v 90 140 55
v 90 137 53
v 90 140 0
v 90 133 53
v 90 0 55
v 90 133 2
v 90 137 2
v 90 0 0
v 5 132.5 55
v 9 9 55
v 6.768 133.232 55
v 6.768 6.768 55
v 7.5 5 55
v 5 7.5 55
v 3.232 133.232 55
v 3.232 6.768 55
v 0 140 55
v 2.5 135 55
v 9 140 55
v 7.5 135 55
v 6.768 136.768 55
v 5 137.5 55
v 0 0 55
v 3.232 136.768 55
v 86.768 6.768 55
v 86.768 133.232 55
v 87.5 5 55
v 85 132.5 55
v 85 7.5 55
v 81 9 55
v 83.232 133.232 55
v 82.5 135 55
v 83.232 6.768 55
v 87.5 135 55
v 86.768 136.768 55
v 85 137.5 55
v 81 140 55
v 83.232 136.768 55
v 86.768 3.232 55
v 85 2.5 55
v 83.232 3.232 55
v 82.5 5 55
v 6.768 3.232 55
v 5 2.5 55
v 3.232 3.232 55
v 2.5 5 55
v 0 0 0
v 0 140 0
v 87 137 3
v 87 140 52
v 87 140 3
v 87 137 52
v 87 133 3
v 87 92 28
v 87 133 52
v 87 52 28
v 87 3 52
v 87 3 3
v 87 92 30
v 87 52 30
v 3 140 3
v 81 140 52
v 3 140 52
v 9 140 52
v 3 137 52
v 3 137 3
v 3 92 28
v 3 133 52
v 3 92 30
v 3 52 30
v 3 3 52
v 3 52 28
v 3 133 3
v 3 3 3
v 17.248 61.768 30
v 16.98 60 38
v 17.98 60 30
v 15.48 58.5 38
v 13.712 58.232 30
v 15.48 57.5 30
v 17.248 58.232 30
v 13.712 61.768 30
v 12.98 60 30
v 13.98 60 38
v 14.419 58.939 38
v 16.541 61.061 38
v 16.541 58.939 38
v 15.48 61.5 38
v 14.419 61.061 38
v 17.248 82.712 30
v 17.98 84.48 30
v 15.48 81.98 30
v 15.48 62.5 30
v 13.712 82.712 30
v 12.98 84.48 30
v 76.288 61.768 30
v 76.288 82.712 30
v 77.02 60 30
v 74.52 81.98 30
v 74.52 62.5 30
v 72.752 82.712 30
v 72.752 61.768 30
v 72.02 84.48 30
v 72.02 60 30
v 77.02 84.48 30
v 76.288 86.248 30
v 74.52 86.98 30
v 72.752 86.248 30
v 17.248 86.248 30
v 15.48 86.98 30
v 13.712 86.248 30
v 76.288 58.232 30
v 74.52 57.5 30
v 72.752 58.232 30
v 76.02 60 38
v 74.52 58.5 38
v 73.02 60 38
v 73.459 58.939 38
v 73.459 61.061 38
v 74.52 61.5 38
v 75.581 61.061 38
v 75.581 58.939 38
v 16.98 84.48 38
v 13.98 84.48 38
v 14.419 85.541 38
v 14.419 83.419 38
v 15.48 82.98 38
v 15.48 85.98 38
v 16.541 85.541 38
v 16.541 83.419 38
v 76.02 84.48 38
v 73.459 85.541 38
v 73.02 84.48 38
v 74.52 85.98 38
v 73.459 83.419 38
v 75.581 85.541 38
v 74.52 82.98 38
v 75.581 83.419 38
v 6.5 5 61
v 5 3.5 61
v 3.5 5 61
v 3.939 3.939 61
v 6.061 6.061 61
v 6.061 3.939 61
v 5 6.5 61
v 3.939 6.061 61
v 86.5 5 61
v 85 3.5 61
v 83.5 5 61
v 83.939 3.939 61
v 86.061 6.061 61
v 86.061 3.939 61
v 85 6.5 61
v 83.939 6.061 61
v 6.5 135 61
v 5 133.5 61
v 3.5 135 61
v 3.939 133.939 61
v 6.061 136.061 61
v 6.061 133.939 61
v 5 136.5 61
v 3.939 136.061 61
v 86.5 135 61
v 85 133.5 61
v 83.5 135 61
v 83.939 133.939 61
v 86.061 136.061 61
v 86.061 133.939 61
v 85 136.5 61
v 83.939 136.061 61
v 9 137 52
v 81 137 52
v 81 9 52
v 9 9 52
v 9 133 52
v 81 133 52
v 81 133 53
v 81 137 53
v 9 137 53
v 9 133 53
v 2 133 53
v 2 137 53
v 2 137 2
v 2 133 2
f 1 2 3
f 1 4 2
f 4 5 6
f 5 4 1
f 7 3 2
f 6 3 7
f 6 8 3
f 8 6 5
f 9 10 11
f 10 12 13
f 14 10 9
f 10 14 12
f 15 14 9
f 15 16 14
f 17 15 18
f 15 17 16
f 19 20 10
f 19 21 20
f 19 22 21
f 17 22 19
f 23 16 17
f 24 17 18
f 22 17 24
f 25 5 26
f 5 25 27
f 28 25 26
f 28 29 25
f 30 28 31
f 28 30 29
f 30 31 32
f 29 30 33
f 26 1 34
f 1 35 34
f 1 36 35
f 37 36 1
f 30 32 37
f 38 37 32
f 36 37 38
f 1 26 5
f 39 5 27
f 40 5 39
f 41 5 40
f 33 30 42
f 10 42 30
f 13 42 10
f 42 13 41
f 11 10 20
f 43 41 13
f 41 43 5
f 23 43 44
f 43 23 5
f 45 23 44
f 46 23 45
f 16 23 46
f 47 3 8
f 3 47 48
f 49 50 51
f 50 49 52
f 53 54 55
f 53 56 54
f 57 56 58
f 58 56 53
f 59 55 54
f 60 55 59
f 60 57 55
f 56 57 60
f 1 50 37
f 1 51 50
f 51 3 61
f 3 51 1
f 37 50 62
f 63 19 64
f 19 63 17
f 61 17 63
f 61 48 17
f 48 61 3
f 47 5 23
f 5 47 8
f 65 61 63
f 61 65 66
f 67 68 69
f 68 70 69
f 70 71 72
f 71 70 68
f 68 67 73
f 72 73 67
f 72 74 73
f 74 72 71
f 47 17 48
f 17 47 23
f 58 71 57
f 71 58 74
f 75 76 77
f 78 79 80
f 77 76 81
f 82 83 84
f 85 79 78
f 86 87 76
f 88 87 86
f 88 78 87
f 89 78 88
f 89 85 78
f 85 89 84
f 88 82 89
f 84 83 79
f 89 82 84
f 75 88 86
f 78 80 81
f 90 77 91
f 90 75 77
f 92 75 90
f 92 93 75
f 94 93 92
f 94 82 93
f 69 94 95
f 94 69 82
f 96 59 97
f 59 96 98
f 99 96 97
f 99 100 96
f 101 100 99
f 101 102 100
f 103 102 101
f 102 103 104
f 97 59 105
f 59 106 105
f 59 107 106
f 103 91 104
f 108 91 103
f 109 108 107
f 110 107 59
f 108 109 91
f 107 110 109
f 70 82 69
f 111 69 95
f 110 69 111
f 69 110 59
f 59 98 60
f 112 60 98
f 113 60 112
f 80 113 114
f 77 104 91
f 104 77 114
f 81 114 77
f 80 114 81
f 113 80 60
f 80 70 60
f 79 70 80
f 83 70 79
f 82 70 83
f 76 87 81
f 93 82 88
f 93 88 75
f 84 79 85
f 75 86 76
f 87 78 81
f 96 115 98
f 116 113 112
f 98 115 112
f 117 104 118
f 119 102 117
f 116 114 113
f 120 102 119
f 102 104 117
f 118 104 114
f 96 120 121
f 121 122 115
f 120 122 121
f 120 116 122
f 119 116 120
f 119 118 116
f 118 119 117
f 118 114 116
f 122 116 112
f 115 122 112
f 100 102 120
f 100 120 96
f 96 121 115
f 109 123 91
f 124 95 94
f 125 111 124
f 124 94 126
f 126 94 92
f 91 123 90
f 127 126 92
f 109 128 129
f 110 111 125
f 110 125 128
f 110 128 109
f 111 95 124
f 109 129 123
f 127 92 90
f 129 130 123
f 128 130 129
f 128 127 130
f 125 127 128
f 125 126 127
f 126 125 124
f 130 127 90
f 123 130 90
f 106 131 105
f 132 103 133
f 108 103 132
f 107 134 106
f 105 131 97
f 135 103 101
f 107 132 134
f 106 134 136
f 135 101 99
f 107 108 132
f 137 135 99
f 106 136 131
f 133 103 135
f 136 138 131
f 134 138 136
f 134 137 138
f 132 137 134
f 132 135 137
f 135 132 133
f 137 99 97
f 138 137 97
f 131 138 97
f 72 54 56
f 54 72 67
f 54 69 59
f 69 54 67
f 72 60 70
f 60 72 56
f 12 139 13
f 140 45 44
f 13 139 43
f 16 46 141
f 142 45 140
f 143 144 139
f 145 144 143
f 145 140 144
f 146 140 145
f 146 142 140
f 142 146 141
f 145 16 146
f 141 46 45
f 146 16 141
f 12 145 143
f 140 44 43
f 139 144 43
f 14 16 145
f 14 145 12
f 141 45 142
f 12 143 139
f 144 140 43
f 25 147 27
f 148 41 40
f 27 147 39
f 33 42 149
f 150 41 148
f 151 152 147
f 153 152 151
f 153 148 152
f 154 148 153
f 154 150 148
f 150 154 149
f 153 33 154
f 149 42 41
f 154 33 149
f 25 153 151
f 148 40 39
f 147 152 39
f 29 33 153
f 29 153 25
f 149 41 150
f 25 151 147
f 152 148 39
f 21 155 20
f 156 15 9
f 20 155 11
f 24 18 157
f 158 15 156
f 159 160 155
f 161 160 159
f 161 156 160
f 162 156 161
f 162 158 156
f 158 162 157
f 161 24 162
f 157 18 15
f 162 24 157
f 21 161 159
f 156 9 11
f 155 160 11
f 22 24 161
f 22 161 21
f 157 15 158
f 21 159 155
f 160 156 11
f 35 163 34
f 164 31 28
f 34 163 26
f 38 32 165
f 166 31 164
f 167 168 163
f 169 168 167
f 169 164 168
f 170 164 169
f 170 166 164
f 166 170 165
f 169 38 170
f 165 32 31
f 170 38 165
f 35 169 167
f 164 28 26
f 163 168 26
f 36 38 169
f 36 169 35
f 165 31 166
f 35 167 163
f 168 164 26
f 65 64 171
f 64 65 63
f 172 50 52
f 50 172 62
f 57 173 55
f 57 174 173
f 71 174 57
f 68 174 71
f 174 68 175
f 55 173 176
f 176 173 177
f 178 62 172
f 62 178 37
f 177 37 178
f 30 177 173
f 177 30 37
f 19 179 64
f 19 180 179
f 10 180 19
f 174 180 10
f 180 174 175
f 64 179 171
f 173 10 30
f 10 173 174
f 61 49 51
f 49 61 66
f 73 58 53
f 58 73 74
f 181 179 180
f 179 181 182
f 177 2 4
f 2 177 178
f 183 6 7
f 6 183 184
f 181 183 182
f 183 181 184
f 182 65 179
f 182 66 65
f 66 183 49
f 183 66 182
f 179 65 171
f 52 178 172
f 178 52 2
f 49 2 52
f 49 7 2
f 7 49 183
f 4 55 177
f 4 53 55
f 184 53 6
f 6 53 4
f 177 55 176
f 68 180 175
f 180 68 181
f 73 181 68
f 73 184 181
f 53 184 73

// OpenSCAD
// file: params.scad
// Ansible widget cases
//
// Params: sets the we want
// -----------------------------------------------------------------------------

// Overall case
CASE_WIDTH = 90;
CASE_LENGTH = 140;
CASE_HEIGHT = 55;
WALL_THICKNESS = 3;
FLOOR_THICKNESS = WALL_THICKNESS;

// -----------------------------------------------------------------------------

// Front door
FRONT_DOOR_THICKNESS = 3;
FRONT_DOOR_INSET = 1;  // how much gap to give
FRONT_DOOR_OFFSET_Y = 4; // how far in from the edge
FRONT_DOOR_WIDTH = CASE_WIDTH - WALL_THICKNESS - FRONT_DOOR_INSET;
FRONT_DOOR_HEIGHT = CASE_HEIGHT - (WALL_THICKNESS * 2) + (FRONT_DOOR_INSET * 2);

// -----------------------------------------------------------------------------

// Pi shelf
SHELF_THICKNESS = WALL_THICKNESS - 1;
SHELF_Y = 52;
SHELF_LENGTH = 40;
SHELF_HEIGHT = 28;
SHELF_PEG_OFFSET_X = 3.5;
SHELF_PEG_OFFSET_Y = 3.0;
SHELF_PEG_HEIGHT = 8;
SHELF_PEG_RADIUS_BASE = 2.5;
SHELF_PEG_RADIUS_TOP = 1.5;

// -----------------------------------------------------------------------------

// Lid
LID_THICKNESS = WALL_THICKNESS;
DOCK_BORDER_HEIGHT = 9;
DOCK_BORDER_THICKNESS = 4;
DOCK_INSET = 2;

// Lid ridge
RIDGE_THICKNESS = WALL_THICKNESS * 2;
RIDGE_PEG_HEIGHT = 6;
RIDGE_PEG_RADIUS_BASE = 2.5;
RIDGE_PEG_RADIUS_TOP = 1.5;
RIDGE_PEG_RADIUS_HOLE = 2;
RIDGE_PEG_OFFSET = 5;

// -----------------------------------------------------------------------------

// General mount
MOUNT_HEIGHT = 15;
MOUNT_THICKNESS = 3;

// Selector dock
SELECTOR_DOCK_Y = CASE_LENGTH * .78;
SELECTOR_DOCK_RADIUS = 18;
SELECTOR_DOCK_BORDER_RADIUS = SELECTOR_DOCK_RADIUS + DOCK_BORDER_THICKNESS;
SELECTOR_HOLE_OFFSET = DOCK_BORDER_THICKNESS;
SELECTOR_HOLE_SIZE = SELECTOR_DOCK_RADIUS - SELECTOR_HOLE_OFFSET;

// Selector mount
SELECTOR_MOUNT_OFFSET = 0.5;
SELECTOR_MOUNT_RADIUS = SELECTOR_DOCK_RADIUS - SELECTOR_MOUNT_OFFSET;
SELECTOR_HOLE_RADIUS = SELECTOR_MOUNT_RADIUS - SELECTOR_HOLE_OFFSET;
SELECTOR_GRIP_HEIGHT = 5;
SELECTOR_GRIP_THICKNESS = 7;

// Widget dock
WIDGET_DOCK_Y = CASE_LENGTH * .15;
WIDGET_DOCK_SIZE = 32;
WIDGET_BORDER_RADIUS = 5/2;
WIDGET_HOLE_OFFSET = DOCK_BORDER_THICKNESS * 2;
WIDGET_HOLE_SIZE = WIDGET_DOCK_SIZE - WIDGET_HOLE_OFFSET;

// -----------------------------------------------------------------------------

// Pi
PI_COLOR = [0.3, 0.4, 0.3];
PI_Y = SHELF_Y + 5;
PI_WIDTH = 66.04;
PI_LENGTH = 30.48;
PI_DEPTH = 1.5;

// Battery pack
BATTERY_COLOR = [0.2, 0.2, 0.2];
BATTERY_WIDTH = 68.58;
BATTERY_LENGTH = 96.52;
BATTERY_DEPTH = 22.86;

// -----------------------------------------------------------------------------

// Magnet selector
MAGNET_PEG_HEIGHT = 7;
MAGNET_PEG_RADIUS_BASE = 2.5;
MAGNET_PEG_RADIUS_TOP = 1.5;
MAGNET_BASE_HEIGHT = 2;
MAGNET_BOARD_WIDTH = 23;
MAGNET_BOARD_HEIGHT = 21;
MAGNET_HOLE_WIDTH = MAGNET_BOARD_WIDTH - 5;
MAGNET_HOLE_LENGTH = 10;
MAGNET_BOARD_INSET = 1;
MAGNET_BOARD_INSET_WIDTH = MAGNET_BOARD_WIDTH + MAGNET_BOARD_INSET;
MAGNET_BOARD_INSET_HEIGHT = MAGNET_BOARD_HEIGHT + MAGNET_BOARD_INSET;
MAGNET_BOARD_INSET_DEPTH = 1;
// main file
// Ansible widget cases
//
// Case: walls and floor for case
// -----------------------------------------------------------------------------

include <params.scad>;

// -----------------------------------------------------------------------------

module case() {
	// Difference to cut out door slot
	difference() {
		// Union floor, side walls, ridge, shelf
		union() {
			// Floor
			cube([CASE_WIDTH, CASE_LENGTH, FLOOR_THICKNESS]);
			
			// Side and back walls
			_case_walls();
			
			// Pi shelf
			_pi_shelf();
		   
			// Ridges
			_ridges();
		}
			
		// Cut out the door slot
		_door_slot();
	}
}

// -----------------------------------------------------------------------------

module _case_walls() {
	// Side wall (far side)
	translate([
		CASE_WIDTH - WALL_THICKNESS,
		0,
		0
	])
		cube([WALL_THICKNESS, CASE_LENGTH, CASE_HEIGHT]);
	
	// Side wall (near side)
	translate([
		0,
		0,
		0
	])
		cube([WALL_THICKNESS, CASE_LENGTH, CASE_HEIGHT]);

	// Back wall
	cube([CASE_WIDTH, WALL_THICKNESS, CASE_HEIGHT]);
}

// -----------------------------------------------------------------------------

module _ridges() {
	// Side ridge (far)
	translate([
		CASE_WIDTH - RIDGE_THICKNESS - WALL_THICKNESS,
		WALL_THICKNESS,
		CASE_HEIGHT - WALL_THICKNESS
	])
		cube([
			RIDGE_THICKNESS,
			CASE_LENGTH - WALL_THICKNESS,
			WALL_THICKNESS
		]);

	// Side ridge (near)
	translate([
		WALL_THICKNESS,
		WALL_THICKNESS,
		CASE_HEIGHT - WALL_THICKNESS
	])
		cube([
			RIDGE_THICKNESS,
			CASE_LENGTH - WALL_THICKNESS,
			WALL_THICKNESS
		]);

	// Back ridge
	translate([
		0,
		WALL_THICKNESS,
		CASE_HEIGHT - WALL_THICKNESS
	])
		cube([
			CASE_WIDTH,
			RIDGE_THICKNESS,
			WALL_THICKNESS
		]);

	// Ridge pegs
	_ridge_pegs();
}

// -----------------------------------------------------------------------------

module _ridge_pegs() {    
	translate([
		RIDGE_PEG_OFFSET,
		RIDGE_PEG_OFFSET,
		CASE_HEIGHT
	])
		cylinder(RIDGE_PEG_HEIGHT, RIDGE_PEG_RADIUS_BASE, RIDGE_PEG_RADIUS_TOP);

	translate([
		CASE_WIDTH - RIDGE_PEG_OFFSET,
		RIDGE_PEG_OFFSET,
		CASE_HEIGHT
	])
		cylinder(RIDGE_PEG_HEIGHT, RIDGE_PEG_RADIUS_BASE, RIDGE_PEG_RADIUS_TOP);

	translate([
		RIDGE_PEG_OFFSET,
		CASE_LENGTH - RIDGE_PEG_OFFSET,
		CASE_HEIGHT
	])
		cylinder(RIDGE_PEG_HEIGHT, RIDGE_PEG_RADIUS_BASE, RIDGE_PEG_RADIUS_TOP);

	translate([
		CASE_WIDTH - RIDGE_PEG_OFFSET,
		CASE_LENGTH - RIDGE_PEG_OFFSET,
		CASE_HEIGHT
	])
		cylinder(RIDGE_PEG_HEIGHT, RIDGE_PEG_RADIUS_BASE, RIDGE_PEG_RADIUS_TOP);
}

// -----------------------------------------------------------------------------

module _pi_shelf() {
	// Pi shelf
	translate([
		0,
		// Move it down to the right spot in the case
		SHELF_Y,
		// Move it up to the right height (with room for the battery)
		SHELF_HEIGHT
	])
		cube([CASE_WIDTH, SHELF_LENGTH, SHELF_THICKNESS]);

	// Pi pegs
	translate([
		// Center it
		(CASE_WIDTH / 2) - (PI_WIDTH / 2),
		// Move it down to the right spot on the shelf
		PI_Y,
		// Put it right on top of the shelf
		SHELF_HEIGHT + SHELF_THICKNESS
	])
		_pi_pegs();
}

// -----------------------------------------------------------------------------

module _pi_pegs() {    
    translate([
		SHELF_PEG_OFFSET_X,
		SHELF_PEG_OFFSET_Y,
		0
	])
        cylinder(SHELF_PEG_HEIGHT, SHELF_PEG_RADIUS_BASE, SHELF_PEG_RADIUS_TOP);

    translate([
		// Offset from end of Pi
		PI_WIDTH - SHELF_PEG_OFFSET_X,
		SHELF_PEG_OFFSET_Y,
		0
	])
        cylinder(SHELF_PEG_HEIGHT, SHELF_PEG_RADIUS_BASE, SHELF_PEG_RADIUS_TOP);

    translate([
		SHELF_PEG_OFFSET_X,
		// Offset from end of Pi
		PI_LENGTH - SHELF_PEG_OFFSET_Y,
		0
	])
        cylinder(SHELF_PEG_HEIGHT, SHELF_PEG_RADIUS_BASE, SHELF_PEG_RADIUS_TOP);

    translate([
		// Offset from end of Pi
		PI_WIDTH - SHELF_PEG_OFFSET_X,
		// Offset from end of Pi
		PI_LENGTH - SHELF_PEG_OFFSET_Y,
		0
	])
        cylinder(SHELF_PEG_HEIGHT, SHELF_PEG_RADIUS_BASE, SHELF_PEG_RADIUS_TOP);
}

// -----------------------------------------------------------------------------

module _door_slot() {
	// Cut out the door slot
	translate([
		// Move in enough for the inset
		WALL_THICKNESS - FRONT_DOOR_INSET,
		// Put it at the end of the case, subtracting the wall and the
		// offset
		CASE_LENGTH - WALL_THICKNESS - FRONT_DOOR_OFFSET_Y,
		// Move in enough for the inset
		WALL_THICKNESS - FRONT_DOOR_INSET
	])
		cube([
			// Door slot should go full width so the one side is open
			CASE_WIDTH,
			// Door slot thickness
			FRONT_DOOR_THICKNESS + FRONT_DOOR_INSET,
			// Door slot height should carve out enough for the inset
			CASE_HEIGHT - WALL_THICKNESS - FRONT_DOOR_INSET
		]);
}

// -----------------------------------------------------------------------------

case();
